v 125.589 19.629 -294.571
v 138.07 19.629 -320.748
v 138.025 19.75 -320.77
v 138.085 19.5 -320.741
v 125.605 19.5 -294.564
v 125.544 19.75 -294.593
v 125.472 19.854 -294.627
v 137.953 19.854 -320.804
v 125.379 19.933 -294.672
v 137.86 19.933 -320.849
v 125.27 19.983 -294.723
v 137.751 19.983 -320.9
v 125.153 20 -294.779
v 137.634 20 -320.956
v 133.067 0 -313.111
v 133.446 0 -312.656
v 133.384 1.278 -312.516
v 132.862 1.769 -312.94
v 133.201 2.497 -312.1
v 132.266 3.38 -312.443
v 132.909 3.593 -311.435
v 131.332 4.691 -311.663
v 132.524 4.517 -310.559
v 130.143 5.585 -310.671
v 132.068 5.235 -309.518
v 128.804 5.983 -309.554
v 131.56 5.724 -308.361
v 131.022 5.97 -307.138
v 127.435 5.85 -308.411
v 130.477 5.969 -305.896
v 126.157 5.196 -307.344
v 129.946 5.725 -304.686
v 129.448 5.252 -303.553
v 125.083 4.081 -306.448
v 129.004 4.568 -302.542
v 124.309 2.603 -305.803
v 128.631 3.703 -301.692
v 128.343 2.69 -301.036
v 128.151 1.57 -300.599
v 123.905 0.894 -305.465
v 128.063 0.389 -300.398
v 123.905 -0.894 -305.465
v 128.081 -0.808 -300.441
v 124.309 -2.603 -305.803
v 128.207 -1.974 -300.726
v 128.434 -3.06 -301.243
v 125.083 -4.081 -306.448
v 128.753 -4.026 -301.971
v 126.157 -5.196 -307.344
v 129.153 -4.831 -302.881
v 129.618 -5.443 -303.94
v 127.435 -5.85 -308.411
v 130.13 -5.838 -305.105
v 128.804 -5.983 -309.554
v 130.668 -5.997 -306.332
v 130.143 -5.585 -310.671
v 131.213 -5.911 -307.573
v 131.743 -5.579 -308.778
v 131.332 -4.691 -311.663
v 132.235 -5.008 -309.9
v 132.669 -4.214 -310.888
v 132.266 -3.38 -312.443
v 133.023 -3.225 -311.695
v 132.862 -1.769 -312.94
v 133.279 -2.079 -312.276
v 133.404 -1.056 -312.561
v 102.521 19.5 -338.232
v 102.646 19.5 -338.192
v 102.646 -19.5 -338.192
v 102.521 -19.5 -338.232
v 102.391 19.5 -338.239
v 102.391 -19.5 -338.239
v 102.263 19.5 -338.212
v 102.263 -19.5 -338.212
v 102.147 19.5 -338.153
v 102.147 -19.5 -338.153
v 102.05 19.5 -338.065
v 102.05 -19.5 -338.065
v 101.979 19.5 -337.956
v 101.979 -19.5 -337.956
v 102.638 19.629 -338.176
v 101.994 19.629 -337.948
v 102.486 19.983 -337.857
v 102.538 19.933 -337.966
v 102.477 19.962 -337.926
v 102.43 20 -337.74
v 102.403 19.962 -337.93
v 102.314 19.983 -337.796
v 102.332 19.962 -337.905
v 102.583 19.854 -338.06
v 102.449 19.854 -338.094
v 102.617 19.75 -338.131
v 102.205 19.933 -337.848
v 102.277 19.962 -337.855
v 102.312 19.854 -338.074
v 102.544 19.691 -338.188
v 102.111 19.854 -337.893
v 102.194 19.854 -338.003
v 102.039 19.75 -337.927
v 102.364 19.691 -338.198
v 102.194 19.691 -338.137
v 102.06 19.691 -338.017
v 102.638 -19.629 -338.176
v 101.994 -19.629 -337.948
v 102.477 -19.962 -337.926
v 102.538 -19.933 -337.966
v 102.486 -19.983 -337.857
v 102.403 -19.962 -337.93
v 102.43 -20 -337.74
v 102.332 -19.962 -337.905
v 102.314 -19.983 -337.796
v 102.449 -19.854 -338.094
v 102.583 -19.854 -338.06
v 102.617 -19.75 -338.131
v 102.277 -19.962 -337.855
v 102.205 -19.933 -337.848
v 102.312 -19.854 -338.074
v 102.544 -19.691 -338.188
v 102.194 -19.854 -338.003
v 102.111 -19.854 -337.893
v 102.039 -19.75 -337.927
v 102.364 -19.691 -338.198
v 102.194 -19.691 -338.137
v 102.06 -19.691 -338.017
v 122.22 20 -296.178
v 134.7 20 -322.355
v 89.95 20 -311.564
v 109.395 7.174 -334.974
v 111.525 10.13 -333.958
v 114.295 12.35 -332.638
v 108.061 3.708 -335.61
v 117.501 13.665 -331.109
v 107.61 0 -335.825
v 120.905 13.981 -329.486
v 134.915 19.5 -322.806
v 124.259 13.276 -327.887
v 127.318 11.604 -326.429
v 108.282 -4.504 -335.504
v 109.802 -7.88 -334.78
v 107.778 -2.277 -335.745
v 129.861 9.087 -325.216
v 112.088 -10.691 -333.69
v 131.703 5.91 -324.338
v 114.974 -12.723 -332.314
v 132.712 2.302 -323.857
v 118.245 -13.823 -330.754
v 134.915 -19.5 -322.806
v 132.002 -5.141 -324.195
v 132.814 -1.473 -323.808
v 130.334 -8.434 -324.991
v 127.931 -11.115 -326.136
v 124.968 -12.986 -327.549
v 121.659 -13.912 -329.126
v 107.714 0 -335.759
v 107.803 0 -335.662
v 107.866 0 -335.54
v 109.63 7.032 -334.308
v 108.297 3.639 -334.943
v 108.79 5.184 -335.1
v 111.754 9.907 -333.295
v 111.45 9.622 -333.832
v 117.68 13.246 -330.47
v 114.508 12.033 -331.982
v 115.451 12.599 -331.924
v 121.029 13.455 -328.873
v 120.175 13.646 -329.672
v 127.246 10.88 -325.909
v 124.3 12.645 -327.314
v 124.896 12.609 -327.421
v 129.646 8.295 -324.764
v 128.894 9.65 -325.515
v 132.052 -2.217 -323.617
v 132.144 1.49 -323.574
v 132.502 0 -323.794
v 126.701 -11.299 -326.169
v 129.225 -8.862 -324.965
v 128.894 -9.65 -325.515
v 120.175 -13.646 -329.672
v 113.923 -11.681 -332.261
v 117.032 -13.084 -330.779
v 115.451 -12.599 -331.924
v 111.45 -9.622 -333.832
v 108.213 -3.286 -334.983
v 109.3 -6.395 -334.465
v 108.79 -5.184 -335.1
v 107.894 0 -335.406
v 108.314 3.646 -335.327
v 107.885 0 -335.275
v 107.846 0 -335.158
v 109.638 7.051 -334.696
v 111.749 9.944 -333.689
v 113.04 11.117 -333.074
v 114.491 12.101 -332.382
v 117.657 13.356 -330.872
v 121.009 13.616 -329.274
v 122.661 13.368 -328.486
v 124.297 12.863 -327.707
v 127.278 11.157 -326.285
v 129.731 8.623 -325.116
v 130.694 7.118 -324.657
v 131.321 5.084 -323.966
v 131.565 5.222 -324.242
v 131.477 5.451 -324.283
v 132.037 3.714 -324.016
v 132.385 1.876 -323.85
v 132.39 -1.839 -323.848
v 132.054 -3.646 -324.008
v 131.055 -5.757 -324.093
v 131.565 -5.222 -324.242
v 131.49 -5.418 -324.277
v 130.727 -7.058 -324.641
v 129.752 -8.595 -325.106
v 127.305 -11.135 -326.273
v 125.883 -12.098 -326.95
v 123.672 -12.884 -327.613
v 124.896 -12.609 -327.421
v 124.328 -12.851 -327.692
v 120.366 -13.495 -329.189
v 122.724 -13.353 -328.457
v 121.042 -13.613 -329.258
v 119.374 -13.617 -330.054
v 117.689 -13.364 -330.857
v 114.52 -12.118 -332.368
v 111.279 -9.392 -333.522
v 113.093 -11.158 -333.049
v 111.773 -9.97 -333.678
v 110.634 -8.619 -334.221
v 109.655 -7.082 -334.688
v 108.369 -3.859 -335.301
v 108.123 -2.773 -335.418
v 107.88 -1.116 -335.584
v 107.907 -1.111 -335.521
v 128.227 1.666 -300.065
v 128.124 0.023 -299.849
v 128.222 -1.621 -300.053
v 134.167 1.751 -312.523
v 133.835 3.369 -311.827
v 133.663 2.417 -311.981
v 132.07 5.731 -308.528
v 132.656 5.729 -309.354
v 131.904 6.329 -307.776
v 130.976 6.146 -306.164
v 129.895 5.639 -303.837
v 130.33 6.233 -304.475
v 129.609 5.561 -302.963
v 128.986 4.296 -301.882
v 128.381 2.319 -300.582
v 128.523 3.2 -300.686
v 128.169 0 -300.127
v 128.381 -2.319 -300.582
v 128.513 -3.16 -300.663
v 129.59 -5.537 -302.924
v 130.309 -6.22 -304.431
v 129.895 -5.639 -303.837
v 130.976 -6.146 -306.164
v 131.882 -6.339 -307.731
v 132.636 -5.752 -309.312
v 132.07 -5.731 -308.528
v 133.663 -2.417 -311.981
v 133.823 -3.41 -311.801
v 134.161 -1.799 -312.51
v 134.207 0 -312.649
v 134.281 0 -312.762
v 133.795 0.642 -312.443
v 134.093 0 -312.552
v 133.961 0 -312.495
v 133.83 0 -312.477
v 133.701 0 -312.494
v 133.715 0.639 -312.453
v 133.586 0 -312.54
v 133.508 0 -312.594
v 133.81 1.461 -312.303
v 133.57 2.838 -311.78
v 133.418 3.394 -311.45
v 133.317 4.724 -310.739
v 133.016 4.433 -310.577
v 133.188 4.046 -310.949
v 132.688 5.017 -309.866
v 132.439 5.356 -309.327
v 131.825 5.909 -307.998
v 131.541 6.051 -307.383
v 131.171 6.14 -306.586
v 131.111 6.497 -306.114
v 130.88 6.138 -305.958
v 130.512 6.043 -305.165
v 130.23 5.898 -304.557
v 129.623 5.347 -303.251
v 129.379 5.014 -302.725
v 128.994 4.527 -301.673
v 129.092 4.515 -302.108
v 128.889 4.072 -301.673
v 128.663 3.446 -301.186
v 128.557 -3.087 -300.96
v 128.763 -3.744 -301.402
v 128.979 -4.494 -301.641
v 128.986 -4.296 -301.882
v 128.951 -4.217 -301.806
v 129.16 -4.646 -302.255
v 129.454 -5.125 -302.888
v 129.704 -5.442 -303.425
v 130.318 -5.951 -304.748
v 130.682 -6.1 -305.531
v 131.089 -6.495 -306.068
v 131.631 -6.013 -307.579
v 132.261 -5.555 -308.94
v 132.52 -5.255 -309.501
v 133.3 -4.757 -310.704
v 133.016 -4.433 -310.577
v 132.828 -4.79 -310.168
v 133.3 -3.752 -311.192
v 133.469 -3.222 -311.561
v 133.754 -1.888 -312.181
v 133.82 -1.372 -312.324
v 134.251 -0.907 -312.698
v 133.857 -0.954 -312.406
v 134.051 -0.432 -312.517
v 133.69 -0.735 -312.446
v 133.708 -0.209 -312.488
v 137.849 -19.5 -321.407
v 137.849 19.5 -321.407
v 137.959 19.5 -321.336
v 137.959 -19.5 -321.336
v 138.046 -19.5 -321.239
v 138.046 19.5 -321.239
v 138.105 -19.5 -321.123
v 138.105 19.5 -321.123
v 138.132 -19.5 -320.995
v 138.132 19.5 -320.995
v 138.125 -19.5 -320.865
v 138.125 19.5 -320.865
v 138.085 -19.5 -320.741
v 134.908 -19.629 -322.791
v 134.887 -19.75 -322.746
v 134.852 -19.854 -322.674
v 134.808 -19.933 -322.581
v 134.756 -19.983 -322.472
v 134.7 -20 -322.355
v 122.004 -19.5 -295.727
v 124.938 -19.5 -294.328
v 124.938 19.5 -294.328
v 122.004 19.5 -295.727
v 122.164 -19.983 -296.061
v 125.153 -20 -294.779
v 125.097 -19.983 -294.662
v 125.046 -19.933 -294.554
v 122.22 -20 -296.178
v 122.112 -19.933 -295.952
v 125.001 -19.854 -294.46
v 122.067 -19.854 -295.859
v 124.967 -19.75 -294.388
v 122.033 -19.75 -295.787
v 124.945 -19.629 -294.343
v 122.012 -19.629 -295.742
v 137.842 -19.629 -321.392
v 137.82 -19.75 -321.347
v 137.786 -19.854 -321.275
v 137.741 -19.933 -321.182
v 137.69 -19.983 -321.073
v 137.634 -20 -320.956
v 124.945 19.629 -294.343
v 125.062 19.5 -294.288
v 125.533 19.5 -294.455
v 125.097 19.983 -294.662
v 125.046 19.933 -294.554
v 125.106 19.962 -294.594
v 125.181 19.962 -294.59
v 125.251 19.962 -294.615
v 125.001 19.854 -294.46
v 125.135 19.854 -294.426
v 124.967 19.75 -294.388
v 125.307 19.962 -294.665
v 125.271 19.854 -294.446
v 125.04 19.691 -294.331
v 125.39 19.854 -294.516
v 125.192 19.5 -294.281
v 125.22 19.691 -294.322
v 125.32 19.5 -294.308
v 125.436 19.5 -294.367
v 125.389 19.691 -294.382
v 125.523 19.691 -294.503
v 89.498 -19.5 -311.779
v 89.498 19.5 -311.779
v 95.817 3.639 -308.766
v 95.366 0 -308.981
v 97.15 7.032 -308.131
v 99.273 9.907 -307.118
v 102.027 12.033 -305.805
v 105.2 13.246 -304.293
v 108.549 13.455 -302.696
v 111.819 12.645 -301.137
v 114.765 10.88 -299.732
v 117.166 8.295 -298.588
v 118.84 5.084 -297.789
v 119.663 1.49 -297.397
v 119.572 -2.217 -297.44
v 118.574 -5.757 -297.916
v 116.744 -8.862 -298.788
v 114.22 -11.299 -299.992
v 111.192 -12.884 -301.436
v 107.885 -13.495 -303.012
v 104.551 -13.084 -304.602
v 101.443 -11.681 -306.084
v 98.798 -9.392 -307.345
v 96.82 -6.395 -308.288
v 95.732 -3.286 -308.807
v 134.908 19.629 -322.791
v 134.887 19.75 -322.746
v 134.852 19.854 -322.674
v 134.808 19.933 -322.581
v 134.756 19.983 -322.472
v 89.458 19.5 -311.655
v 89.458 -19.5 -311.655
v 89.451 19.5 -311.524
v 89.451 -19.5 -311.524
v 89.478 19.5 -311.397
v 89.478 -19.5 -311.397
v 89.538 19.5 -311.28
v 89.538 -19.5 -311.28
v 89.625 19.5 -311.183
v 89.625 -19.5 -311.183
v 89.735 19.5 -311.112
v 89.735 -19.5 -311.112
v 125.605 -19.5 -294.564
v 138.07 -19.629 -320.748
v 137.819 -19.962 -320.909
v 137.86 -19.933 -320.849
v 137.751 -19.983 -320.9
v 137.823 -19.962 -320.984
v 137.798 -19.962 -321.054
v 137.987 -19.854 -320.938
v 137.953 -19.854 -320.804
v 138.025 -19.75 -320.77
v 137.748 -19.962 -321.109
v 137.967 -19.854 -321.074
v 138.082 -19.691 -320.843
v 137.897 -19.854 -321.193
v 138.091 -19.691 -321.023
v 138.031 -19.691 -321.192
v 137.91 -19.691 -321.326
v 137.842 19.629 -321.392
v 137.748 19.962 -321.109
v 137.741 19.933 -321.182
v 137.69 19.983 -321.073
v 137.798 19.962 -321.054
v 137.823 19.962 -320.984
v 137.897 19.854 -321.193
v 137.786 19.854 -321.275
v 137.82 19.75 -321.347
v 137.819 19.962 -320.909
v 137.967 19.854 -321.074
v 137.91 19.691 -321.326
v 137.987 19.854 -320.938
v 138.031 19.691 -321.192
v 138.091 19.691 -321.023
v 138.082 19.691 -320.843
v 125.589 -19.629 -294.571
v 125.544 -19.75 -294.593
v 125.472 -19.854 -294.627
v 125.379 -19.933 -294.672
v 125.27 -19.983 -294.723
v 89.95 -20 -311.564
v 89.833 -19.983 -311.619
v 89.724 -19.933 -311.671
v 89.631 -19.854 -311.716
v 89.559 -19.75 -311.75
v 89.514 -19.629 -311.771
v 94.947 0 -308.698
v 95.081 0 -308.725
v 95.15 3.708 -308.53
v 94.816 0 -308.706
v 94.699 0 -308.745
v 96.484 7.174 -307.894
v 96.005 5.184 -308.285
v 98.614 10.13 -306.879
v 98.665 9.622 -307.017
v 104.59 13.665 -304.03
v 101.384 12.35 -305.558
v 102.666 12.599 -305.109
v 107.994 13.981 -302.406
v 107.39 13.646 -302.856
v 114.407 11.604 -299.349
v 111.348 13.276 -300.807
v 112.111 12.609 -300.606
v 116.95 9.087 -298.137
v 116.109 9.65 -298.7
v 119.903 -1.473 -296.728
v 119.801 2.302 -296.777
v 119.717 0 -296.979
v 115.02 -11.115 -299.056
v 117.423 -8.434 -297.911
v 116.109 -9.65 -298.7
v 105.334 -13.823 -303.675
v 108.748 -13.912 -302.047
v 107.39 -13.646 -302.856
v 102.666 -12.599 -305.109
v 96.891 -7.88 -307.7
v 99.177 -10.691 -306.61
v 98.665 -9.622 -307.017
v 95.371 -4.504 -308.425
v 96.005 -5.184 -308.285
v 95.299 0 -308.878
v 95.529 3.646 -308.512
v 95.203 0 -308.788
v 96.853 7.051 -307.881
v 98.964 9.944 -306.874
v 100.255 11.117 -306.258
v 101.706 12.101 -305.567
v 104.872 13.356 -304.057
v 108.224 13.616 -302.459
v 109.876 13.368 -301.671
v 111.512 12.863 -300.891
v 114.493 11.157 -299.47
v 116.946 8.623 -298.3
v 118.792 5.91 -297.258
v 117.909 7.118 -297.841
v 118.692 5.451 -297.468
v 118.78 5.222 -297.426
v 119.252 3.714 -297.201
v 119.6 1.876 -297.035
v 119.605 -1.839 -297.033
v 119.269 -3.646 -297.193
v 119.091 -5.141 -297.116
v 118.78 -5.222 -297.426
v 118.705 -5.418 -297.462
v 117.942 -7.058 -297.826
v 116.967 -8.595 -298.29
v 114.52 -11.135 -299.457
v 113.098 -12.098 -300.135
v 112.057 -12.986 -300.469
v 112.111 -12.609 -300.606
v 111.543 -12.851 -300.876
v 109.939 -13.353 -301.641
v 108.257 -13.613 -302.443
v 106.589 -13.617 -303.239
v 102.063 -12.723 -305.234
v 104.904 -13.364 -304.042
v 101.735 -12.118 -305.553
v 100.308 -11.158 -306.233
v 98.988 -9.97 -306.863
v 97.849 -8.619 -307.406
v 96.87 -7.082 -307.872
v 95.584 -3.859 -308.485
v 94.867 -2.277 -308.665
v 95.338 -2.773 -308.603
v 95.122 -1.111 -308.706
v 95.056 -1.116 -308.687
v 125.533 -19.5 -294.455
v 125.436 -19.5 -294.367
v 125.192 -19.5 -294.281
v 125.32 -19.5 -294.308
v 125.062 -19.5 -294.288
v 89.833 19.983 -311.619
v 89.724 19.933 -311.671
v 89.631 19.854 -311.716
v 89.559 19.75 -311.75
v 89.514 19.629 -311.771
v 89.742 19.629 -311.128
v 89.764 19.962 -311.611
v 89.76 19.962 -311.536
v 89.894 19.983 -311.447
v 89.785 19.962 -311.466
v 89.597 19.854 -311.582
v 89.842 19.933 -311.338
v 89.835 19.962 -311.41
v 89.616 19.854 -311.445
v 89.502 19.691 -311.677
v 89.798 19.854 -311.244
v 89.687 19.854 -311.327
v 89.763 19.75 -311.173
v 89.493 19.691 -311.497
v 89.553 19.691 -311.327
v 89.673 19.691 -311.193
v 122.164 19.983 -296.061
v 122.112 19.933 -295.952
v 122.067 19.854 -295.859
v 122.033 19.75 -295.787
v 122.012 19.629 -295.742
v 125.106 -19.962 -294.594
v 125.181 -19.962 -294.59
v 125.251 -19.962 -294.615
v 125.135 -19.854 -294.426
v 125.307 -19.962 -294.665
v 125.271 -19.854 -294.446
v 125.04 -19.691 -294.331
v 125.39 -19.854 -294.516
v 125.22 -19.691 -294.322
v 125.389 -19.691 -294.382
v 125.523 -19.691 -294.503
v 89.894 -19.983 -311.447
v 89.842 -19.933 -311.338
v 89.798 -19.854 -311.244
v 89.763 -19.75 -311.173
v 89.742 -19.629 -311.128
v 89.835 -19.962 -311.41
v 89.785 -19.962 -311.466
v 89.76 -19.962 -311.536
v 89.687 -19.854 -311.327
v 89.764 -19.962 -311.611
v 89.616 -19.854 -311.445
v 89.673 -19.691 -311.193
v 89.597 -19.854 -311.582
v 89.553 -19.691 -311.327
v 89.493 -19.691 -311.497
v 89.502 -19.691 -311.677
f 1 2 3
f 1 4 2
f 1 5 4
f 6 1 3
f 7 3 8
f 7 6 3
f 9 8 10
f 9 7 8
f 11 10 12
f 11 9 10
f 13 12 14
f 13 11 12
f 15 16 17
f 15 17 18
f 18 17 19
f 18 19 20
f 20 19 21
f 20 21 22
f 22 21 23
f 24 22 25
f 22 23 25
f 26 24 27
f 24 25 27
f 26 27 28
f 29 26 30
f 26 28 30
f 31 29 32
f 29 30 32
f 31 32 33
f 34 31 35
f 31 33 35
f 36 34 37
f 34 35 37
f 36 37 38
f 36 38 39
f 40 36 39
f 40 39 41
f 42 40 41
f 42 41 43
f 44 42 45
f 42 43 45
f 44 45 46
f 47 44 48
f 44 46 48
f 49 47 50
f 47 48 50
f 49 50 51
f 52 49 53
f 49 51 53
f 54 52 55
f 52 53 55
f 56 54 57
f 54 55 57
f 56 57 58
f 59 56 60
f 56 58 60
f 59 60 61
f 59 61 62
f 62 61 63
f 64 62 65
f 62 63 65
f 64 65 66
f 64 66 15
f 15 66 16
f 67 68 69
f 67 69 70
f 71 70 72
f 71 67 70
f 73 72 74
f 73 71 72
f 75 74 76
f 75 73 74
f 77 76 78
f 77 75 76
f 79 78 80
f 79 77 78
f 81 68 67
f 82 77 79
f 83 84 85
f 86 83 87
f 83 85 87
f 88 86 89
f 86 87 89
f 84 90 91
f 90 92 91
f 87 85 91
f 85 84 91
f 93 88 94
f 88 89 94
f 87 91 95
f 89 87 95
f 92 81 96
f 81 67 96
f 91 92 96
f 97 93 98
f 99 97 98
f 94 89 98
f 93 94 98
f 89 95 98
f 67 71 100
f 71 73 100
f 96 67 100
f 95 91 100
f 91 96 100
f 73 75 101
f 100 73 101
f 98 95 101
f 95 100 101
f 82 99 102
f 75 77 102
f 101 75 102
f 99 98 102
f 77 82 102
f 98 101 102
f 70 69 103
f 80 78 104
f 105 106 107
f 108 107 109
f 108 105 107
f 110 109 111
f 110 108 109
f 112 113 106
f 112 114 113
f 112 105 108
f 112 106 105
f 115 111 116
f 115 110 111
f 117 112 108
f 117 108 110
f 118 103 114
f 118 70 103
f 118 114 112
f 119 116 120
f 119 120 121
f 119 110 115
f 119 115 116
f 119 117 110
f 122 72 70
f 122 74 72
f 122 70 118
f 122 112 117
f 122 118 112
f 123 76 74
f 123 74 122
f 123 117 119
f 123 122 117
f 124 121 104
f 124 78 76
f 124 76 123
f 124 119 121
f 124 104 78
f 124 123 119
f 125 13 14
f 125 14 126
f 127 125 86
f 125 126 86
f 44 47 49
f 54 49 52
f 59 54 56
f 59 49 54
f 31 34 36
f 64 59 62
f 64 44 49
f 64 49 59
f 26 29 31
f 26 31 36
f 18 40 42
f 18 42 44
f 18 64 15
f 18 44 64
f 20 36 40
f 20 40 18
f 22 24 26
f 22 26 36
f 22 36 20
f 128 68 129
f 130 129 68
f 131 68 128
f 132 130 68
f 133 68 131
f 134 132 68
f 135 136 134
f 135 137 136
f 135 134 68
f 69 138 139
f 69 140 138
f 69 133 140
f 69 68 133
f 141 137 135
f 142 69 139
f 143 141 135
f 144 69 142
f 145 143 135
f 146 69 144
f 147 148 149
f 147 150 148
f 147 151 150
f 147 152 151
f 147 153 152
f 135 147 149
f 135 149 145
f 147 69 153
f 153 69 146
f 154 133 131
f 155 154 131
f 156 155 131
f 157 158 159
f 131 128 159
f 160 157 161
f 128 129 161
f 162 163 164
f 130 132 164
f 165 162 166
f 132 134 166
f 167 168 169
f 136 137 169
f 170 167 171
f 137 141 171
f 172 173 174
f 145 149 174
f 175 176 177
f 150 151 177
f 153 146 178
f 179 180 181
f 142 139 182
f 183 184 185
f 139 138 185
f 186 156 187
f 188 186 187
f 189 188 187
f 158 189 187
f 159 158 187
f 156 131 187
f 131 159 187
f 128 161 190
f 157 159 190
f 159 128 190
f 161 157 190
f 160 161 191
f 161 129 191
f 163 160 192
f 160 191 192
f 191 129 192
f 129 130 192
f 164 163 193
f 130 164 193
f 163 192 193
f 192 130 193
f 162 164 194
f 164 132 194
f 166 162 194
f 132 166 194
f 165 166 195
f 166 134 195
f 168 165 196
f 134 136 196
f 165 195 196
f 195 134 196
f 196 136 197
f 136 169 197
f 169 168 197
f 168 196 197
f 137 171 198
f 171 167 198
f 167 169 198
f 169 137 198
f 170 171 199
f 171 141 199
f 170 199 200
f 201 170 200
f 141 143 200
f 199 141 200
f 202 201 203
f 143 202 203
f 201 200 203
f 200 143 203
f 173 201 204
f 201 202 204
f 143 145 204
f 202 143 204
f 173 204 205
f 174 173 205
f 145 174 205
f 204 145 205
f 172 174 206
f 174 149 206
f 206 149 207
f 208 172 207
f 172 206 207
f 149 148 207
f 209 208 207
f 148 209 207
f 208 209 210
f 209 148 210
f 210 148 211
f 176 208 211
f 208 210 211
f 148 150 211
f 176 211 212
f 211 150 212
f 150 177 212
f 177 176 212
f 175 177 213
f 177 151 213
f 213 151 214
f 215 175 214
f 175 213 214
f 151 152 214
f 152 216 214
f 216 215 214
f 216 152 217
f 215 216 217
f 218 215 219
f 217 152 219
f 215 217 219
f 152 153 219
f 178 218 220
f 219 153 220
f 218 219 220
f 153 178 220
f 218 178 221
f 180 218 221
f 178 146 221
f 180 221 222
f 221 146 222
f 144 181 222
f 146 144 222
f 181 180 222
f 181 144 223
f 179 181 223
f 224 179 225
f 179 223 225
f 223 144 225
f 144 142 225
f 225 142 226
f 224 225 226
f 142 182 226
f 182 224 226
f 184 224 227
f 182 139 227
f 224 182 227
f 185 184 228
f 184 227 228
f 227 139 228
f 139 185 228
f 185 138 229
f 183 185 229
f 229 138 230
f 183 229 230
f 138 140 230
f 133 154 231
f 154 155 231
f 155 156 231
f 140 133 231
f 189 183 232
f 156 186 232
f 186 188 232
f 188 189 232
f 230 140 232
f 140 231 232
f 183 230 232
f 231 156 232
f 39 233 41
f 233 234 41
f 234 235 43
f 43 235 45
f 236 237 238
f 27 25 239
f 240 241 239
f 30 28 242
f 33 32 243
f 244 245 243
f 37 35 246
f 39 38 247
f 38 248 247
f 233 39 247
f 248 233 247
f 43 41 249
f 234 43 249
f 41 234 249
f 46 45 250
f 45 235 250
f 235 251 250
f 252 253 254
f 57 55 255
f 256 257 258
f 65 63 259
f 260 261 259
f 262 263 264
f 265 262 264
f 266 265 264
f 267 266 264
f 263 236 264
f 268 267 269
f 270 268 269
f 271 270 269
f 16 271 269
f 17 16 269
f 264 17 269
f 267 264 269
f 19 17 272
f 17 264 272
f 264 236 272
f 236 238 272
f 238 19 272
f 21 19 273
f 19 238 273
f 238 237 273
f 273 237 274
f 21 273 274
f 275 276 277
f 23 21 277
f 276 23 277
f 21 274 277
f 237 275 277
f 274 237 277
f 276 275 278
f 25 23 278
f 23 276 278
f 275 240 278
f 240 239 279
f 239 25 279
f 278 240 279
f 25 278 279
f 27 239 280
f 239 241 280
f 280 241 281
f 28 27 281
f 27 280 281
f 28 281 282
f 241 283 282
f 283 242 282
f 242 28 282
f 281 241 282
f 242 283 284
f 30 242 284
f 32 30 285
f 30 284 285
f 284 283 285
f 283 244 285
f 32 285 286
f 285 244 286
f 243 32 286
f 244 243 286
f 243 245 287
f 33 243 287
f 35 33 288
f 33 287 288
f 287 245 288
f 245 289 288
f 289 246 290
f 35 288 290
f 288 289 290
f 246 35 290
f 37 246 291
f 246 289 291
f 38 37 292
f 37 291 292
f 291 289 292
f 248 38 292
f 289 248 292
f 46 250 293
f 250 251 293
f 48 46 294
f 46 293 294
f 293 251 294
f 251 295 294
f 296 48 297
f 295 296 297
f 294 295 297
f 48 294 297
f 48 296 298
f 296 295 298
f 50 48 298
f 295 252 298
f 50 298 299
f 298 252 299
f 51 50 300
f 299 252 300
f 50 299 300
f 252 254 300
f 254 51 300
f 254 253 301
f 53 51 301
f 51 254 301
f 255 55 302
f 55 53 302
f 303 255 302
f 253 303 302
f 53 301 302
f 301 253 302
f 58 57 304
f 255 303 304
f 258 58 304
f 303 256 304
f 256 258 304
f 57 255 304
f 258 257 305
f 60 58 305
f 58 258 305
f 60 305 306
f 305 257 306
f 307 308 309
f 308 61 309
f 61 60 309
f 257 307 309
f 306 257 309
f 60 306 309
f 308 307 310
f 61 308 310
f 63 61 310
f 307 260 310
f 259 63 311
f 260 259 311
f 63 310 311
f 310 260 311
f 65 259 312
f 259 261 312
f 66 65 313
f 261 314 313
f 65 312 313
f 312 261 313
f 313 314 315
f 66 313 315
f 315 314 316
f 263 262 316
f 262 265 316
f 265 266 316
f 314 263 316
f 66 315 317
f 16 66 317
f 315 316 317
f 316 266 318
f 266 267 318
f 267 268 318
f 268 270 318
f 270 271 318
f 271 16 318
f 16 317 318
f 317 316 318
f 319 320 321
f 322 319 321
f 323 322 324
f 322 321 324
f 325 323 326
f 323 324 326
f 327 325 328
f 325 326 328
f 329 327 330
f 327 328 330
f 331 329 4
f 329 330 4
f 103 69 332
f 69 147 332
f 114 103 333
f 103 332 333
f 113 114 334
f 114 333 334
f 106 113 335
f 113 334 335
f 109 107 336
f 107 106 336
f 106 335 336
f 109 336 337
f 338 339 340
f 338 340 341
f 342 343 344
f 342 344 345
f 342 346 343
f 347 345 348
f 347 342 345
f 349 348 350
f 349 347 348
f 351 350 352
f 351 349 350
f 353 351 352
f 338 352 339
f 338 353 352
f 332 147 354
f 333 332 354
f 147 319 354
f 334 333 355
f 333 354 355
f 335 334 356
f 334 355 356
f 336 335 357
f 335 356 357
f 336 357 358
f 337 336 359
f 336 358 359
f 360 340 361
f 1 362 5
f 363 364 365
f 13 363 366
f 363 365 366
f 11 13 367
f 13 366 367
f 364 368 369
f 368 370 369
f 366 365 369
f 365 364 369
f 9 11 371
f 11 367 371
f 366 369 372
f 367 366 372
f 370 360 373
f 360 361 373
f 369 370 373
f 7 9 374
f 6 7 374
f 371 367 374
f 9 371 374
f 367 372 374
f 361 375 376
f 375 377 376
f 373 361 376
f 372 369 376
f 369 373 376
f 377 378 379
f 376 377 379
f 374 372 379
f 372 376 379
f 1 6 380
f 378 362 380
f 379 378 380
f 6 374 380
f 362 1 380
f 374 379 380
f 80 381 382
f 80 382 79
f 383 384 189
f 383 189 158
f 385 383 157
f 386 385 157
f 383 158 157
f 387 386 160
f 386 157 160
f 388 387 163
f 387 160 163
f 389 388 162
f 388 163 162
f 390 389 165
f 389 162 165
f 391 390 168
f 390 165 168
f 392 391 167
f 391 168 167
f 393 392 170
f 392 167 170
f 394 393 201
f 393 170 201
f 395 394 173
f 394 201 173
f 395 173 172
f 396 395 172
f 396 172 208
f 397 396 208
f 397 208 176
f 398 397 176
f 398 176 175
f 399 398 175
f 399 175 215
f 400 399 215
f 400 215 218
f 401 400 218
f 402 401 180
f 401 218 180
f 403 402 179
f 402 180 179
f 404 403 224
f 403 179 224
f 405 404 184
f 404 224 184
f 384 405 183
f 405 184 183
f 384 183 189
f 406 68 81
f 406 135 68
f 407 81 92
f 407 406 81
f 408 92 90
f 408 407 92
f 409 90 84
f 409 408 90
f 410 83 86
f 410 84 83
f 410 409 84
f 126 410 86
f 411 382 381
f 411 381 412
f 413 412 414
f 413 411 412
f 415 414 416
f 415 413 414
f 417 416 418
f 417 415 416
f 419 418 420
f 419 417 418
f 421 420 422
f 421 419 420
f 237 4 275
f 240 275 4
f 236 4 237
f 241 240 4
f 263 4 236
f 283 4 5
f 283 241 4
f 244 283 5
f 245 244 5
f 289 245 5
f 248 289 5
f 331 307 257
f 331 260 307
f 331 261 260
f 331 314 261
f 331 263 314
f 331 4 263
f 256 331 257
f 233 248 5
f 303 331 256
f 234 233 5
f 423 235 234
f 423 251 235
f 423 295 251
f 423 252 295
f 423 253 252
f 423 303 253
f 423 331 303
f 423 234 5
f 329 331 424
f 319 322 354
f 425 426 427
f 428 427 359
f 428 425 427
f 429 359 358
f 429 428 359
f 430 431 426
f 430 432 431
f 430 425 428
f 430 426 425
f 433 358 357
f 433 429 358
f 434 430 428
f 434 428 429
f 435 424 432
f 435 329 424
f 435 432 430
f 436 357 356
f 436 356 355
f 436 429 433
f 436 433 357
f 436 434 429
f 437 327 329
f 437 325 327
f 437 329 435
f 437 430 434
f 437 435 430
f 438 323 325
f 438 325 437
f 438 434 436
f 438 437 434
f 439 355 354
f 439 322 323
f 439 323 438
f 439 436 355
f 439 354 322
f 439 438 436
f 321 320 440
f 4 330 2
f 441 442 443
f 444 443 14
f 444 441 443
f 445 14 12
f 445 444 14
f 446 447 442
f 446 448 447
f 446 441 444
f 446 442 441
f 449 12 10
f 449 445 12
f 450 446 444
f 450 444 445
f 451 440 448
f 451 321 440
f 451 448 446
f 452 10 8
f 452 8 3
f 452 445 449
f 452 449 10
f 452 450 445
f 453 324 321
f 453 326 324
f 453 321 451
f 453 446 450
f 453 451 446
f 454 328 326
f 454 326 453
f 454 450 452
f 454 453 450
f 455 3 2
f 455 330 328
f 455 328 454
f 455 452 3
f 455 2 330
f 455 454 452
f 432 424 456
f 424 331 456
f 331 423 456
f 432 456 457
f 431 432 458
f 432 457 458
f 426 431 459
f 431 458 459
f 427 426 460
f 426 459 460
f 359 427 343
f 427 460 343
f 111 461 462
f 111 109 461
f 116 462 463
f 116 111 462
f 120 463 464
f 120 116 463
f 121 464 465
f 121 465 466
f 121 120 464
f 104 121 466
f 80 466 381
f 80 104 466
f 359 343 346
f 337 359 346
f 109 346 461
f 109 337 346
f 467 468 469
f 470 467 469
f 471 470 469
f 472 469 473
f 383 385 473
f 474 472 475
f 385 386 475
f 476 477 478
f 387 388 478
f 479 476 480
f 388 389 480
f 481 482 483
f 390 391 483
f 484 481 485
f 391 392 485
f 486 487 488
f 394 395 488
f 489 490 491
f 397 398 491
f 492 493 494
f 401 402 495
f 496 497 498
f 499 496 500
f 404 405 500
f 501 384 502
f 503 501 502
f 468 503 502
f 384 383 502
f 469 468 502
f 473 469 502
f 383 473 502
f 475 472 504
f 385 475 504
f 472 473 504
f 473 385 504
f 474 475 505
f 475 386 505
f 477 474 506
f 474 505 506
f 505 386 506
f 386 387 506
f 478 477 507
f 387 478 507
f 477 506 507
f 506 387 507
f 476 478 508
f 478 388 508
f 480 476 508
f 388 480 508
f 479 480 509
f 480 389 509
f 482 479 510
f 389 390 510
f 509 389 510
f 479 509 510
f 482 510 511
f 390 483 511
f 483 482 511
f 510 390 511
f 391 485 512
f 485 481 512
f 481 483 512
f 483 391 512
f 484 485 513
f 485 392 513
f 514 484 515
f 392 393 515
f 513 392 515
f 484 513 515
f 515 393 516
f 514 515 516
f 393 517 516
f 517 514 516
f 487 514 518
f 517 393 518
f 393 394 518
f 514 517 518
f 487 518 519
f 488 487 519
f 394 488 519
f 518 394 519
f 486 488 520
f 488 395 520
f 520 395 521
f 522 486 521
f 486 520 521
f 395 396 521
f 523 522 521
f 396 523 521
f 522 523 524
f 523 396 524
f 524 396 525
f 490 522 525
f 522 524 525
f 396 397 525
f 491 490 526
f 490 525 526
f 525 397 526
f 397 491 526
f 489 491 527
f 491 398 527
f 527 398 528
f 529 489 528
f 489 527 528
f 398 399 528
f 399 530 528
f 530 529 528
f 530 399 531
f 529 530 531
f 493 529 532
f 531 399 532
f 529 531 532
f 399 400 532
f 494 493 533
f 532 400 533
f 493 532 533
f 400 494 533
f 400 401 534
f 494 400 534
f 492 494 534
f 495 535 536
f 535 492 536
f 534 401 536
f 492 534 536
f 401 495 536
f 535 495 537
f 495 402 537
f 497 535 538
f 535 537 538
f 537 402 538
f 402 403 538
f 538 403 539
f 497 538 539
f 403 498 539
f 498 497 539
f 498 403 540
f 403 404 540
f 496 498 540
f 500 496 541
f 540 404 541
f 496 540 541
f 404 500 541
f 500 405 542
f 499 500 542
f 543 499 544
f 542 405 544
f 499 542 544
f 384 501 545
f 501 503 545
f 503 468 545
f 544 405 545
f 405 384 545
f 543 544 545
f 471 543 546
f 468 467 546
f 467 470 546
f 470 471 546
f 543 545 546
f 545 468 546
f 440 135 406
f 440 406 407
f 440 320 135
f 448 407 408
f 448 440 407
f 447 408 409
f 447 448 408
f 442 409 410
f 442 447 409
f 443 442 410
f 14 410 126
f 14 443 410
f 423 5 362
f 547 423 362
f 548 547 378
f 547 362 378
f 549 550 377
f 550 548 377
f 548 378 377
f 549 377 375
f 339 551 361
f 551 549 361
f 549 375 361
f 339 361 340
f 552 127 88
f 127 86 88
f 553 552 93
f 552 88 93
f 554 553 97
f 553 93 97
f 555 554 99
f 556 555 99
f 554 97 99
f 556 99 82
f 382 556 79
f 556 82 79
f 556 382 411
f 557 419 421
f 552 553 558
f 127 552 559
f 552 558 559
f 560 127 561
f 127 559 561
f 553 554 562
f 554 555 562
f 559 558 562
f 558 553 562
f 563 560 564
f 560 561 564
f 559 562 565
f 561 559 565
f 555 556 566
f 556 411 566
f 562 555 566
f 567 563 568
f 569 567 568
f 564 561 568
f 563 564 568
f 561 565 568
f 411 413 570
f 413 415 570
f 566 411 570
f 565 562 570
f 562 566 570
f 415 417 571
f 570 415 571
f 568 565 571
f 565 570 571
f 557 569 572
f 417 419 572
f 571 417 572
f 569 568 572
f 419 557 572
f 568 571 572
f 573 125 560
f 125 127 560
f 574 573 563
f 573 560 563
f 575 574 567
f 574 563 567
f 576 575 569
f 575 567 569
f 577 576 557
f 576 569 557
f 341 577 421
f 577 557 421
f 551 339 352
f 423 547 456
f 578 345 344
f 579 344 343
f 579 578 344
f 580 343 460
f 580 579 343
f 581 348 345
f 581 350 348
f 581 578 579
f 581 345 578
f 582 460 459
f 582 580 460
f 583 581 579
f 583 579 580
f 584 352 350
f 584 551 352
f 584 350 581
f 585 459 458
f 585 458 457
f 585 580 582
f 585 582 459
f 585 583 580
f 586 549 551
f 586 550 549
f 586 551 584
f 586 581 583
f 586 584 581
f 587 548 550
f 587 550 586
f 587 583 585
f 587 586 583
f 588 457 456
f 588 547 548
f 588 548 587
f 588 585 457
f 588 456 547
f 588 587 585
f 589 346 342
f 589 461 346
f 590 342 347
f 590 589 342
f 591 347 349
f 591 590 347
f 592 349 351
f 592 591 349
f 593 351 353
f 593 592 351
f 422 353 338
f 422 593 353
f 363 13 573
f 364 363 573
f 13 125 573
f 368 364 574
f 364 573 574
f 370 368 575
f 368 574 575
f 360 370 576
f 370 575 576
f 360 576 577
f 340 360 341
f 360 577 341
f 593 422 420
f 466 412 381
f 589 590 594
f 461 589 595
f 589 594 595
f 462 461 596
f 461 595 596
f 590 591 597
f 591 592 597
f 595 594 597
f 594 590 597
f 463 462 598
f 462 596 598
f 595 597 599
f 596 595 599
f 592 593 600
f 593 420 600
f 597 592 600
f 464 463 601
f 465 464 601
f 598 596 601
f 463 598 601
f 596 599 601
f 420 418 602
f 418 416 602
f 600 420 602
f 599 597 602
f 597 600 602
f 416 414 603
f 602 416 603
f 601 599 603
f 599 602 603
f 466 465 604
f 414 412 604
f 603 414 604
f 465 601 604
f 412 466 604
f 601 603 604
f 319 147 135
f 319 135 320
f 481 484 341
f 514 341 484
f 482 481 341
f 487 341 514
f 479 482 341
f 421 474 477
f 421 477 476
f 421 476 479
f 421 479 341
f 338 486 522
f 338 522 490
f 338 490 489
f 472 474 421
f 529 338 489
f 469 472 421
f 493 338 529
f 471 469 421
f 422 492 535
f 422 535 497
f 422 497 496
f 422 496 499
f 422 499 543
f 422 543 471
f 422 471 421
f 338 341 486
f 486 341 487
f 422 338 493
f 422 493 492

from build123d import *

# Parameters (mm, degrees)
BOSS_EXTRUDE1_DEPTH      = 20
BOSS_EXTRUDE1_DEPTH_BACK = 20
CUT_SWEEP1_PROFILE_R     = 13.5
CUT_SWEEP2_PROFILE_R     = 6
FILLET1_R                = 0.5


with BuildPart() as part:
    # Sketch19 → Boss-Extrude1 (new, two sides: drawn at the far end of the back side and taken through both)
    with BuildSketch(Plane(origin=(0, 0, 0), x_dir=(1, 0, 0), z_dir=(0, 1, 0)).offset(-BOSS_EXTRUDE1_DEPTH_BACK)):
        Polygon((134.915401848, 322.806168715), (138.300353153, 321.192289952), (125.389323054, 294.112679509), (122.004371748, 295.726558271), (89.283175796, 311.327386308), (102.194205895, 338.406996751), align=None)
    extrude(amount=BOSS_EXTRUDE1_DEPTH + BOSS_EXTRUDE1_DEPTH_BACK)

    # Cut-Sweep1: sweep along a path in Sketch5
    with BuildLine(Plane(origin=(0, 0, 0), x_dir=(1, 0, 0), z_dir=(0, 1, 0))) as cut_sweep1_path:
        Line((15.451096543, 110), (223.369661717, 546.088654867))
    # Cut-Sweep1 profile (on start of the path) → Cut-Sweep1 (sweep, cut)
    with BuildSketch(Plane(origin=(15.451096543, 0, -110), x_dir=(-0.9026536814530927, 0, -0.43036766997438236), z_dir=(0.43036766997438236, 0, -0.9026536814530927))):
        Circle(CUT_SWEEP1_PROFILE_R)
    sweep(path=cut_sweep1_path.line, mode=Mode.SUBTRACT)

    # Cut-Sweep2: sweep along a path in Sketch33
    with BuildLine(Plane(origin=(0, 0, 0), x_dir=(1, 0, 0), z_dir=(0, 1, 0))) as cut_sweep2_path:
        Line((128.459886798, 309.266363493), (271.805005174, 137.491575647))
    # Cut-Sweep2 profile (on start of the path) → Cut-Sweep2 (sweep, cut)
    with BuildSketch(Plane(origin=(128.459886798, 0, -309.266363493), x_dir=(0.767782639292157, 0, -0.6407104016648784), z_dir=(0.6407104016648784, 0, 0.767782639292157))):
        Circle(CUT_SWEEP2_PROFILE_R)
    sweep(path=cut_sweep2_path.line, mode=Mode.SUBTRACT)

    # Fillet1
    fillet1_edges = [part.edges().sort_by_distance(p)[0] for p in [
        (138.300353153, 0, -321.192289952),
        (125.389323054, 0, -294.112679509),
        (89.283175796, 0, -311.327386308),
        (102.194205895, 0, -338.406996751),
        (107.336249425, -20, -302.720032908),
        (120.247279524, 20, -329.799643352),
        (95.738690845, 20, -324.867191529),
        (107.336249425, 20, -302.720032908),
        (131.844838103, 20, -307.65248473),
        (131.844838103, -20, -307.65248473),
        (132.433104224, 0, -323.989679807),
        (119.522074124, 0, -296.910069363),
        (128.262320501, -7.134e-05, -300.138507895),
        (120.247279524, -20, -329.799643352),
        (95.738690845, -20, -324.867191529),
    ]]
    fillet(fillet1_edges, radius=FILLET1_R)


solid = part.part
